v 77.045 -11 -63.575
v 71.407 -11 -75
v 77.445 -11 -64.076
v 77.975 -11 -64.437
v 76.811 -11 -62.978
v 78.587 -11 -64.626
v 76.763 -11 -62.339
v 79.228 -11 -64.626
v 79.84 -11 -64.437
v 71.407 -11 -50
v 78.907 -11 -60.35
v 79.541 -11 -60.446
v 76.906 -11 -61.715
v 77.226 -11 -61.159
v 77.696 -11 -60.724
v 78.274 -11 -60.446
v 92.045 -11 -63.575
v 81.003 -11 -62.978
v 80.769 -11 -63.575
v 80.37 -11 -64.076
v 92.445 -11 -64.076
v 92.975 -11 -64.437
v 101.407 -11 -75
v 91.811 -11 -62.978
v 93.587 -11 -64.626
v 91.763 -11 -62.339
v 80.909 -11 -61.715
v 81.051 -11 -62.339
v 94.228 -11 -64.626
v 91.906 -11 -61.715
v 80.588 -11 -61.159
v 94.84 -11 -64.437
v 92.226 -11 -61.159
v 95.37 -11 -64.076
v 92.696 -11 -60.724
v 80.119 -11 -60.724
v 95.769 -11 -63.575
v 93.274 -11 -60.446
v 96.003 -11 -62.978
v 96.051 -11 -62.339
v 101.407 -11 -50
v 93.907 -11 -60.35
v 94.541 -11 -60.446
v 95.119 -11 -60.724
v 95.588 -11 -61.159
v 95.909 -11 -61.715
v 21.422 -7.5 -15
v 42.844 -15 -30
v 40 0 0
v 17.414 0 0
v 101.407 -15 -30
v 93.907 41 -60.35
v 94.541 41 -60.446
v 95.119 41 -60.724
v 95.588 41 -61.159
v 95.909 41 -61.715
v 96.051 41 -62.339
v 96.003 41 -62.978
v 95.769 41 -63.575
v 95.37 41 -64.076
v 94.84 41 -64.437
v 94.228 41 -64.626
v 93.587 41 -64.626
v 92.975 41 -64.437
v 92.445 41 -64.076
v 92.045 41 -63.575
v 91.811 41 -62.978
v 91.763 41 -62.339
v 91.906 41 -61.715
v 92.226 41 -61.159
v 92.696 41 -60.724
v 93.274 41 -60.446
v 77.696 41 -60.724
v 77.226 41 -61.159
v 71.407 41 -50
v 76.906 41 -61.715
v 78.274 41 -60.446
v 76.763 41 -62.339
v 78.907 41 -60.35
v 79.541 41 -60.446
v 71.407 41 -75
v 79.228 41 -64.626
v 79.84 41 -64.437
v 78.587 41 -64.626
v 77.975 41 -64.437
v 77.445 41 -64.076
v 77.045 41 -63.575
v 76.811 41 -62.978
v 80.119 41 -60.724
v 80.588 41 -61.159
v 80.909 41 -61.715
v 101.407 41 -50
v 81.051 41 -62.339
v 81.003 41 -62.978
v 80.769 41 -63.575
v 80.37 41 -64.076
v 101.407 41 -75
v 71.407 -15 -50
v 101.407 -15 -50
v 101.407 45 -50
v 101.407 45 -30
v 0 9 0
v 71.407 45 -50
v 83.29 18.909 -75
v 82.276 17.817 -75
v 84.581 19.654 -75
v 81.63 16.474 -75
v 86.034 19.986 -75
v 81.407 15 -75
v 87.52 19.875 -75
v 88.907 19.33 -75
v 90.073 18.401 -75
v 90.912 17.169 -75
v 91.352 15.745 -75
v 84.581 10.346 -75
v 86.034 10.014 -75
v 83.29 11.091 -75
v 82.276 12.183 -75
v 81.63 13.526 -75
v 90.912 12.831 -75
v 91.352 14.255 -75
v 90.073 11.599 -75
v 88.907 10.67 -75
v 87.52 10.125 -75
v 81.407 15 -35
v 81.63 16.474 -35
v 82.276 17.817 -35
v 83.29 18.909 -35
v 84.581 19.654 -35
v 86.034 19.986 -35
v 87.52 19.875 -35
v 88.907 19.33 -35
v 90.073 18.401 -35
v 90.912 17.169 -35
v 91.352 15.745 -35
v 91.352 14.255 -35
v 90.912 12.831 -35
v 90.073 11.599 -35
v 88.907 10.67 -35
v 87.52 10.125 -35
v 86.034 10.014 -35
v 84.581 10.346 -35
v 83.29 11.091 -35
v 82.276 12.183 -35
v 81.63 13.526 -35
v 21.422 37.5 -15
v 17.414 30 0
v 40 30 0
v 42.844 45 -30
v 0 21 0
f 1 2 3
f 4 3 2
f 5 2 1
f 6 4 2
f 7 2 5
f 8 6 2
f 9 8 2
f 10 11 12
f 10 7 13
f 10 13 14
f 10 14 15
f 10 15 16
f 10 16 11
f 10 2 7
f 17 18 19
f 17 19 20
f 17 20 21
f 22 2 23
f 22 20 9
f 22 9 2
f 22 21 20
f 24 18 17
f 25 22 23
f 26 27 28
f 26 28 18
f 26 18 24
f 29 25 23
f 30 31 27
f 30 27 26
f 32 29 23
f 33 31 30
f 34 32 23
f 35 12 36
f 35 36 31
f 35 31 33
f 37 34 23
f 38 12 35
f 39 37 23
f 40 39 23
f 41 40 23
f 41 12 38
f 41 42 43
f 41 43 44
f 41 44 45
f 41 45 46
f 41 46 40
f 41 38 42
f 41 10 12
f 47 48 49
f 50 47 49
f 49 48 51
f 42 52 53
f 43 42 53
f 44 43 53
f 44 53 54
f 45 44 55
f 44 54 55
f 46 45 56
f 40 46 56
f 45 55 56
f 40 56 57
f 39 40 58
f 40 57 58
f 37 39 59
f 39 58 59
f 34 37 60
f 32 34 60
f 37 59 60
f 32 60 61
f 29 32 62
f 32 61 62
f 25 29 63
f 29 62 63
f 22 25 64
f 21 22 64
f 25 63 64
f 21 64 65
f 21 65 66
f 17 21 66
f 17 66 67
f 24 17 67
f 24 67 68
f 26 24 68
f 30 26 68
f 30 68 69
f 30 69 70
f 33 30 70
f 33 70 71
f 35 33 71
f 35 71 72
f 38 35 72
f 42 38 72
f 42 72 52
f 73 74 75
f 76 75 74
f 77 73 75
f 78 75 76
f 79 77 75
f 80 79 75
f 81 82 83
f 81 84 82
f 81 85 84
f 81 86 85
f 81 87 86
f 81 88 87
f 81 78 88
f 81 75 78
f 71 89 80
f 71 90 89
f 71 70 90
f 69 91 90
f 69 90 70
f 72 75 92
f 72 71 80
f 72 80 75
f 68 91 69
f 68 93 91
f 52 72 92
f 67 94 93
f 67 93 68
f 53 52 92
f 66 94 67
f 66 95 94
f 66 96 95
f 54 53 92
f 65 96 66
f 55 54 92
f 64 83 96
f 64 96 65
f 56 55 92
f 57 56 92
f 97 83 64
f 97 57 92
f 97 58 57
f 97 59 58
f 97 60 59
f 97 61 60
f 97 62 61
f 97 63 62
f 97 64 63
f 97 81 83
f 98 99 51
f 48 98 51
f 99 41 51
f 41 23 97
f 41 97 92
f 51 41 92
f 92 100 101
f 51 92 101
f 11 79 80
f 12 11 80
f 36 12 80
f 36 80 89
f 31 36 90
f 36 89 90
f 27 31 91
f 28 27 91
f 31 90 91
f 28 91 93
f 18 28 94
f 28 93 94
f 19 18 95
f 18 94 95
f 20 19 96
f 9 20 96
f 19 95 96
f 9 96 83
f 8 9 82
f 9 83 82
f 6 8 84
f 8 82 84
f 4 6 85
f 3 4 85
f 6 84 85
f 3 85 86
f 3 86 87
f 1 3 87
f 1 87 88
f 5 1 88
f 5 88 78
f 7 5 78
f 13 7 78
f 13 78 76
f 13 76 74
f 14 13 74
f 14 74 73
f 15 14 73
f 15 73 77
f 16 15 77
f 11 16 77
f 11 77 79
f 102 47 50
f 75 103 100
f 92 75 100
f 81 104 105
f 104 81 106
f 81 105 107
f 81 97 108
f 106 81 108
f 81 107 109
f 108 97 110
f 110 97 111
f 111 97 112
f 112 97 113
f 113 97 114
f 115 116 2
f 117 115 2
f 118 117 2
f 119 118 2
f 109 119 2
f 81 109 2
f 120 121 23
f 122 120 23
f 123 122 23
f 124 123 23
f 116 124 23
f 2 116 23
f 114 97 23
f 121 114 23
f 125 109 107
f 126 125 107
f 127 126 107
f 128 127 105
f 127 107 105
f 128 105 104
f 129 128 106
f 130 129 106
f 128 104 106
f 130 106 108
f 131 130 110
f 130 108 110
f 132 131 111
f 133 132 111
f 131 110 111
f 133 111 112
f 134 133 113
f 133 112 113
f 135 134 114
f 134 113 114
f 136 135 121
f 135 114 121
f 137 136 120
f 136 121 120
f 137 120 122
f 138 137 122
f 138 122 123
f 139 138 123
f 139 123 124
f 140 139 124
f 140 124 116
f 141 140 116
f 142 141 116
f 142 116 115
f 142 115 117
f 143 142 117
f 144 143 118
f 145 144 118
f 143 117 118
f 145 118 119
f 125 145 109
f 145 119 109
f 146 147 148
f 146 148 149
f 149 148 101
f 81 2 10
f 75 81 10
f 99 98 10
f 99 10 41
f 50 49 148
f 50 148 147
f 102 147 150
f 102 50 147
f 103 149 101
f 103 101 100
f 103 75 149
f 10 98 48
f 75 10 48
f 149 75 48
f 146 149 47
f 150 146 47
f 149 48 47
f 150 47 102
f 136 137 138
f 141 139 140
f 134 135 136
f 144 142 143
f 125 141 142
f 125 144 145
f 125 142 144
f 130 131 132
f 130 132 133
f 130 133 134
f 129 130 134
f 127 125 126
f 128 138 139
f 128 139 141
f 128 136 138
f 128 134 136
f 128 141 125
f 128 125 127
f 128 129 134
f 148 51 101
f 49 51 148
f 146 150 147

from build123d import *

# Parameters (mm, degrees)
EXTRUDE_1_DEPTH     = 30
EXTRUDE_2_DEPTH     = 101.4074
CUT_EXTRUDE_2_DEPTH = 140.67269183
CUT_EXTRUDE_3_DEPTH = 134.91587226
SKETCH_10_W         = 30
SKETCH_10_H         = 25
CUT_EXTRUDE_6_DEPTH = 4
SKETCH_11_W         = 30
SKETCH_11_H         = 25
CUT_EXTRUDE_7_DEPTH = 4
SKETCH_13_R         = 2.15
CUT_EXTRUDE_8_DEPTH = 139.001669711
SKETCH_14_R         = 5
CUT_EXTRUDE_9_DEPTH = 40


with BuildPart() as part:
    # 草图2 → 凸台-拉伸1 (new body)
    with BuildSketch(Plane(origin=(0, 0, 0), x_dir=(1, 0, 0), z_dir=(0, 1, 0))):
        Polygon((0, 0), (71.407400337, 50), (71.407400337, 75), (101.407400337, 75), (101.407400337, 30), (40, 0), align=None)
    extrude(amount=EXTRUDE_1_DEPTH)

    # 草图4 → 凸台-拉伸2 (add, through all)
    with BuildSketch(Plane(origin=(101.407400337, 0, 0), x_dir=(0, 0, -1), z_dir=(1, 0, 0))):
        Polygon((0, 30), (30, 45), (75, 45), (75, 30), align=None)
        Polygon((0, 0), (75, 0), (75, -15), (30, -15), align=None)
    extrude(amount=-EXTRUDE_2_DEPTH)

    # 草图5 → 切除-拉伸2 (cut, through all)
    with BuildSketch(Plane.XZ.offset(15)):
        Polygon((40, 0), (101.407400337, 0), (101.407400337, -30), align=None)
        Polygon((0, 0), (0, -75), (71.407400337, -75), (71.407400337, -50), align=None)
    extrude(amount=-CUT_EXTRUDE_2_DEPTH, mode=Mode.SUBTRACT)

    # 草图6 → 切除-拉伸3 (cut, through all)
    with BuildSketch(Plane(origin=(0, 0, 0), x_dir=(-0.8191520442889949, 0, 0.5735764363510418), z_dir=(-0.5735764363510418, 0, -0.8191520442889949))):
        Polygon((0, 21), (-26.151701934, 37.5), (0, 30), align=None)
        Polygon((0, 0), (-26.151701934, -7.5), (0, 9), align=None)
    extrude(amount=-CUT_EXTRUDE_3_DEPTH, mode=Mode.SUBTRACT)

    # 草图10 → 切除-拉伸6 (cut)
    with BuildSketch(Plane.XZ.offset(15)):
        with Locations((86.407400337, -62.5)):
            Rectangle(SKETCH_10_W, SKETCH_10_H)
    extrude(amount=-CUT_EXTRUDE_6_DEPTH, mode=Mode.SUBTRACT)

    # 草图11 → 切除-拉伸7 (cut)
    with BuildSketch(Plane(origin=(0, 45, 0), x_dir=(1, 0, 0), z_dir=(0, 1, 0))):
        with Locations((86.407400337, 62.5)):
            Rectangle(SKETCH_11_W, SKETCH_11_H)
    extrude(amount=-CUT_EXTRUDE_7_DEPTH, mode=Mode.SUBTRACT)

    # 草图13 → 切除-拉伸8 (cut, through all)
    with BuildSketch(Plane(origin=(0, 41, 0), x_dir=(1, 0, 0), z_dir=(0, 1, 0))):
        with Locations(Location((78.907400337, 62.5, 0), (0, 0, 270))):
            Circle(SKETCH_13_R)
        with Locations(Location((93.907400337, 62.5, 0), (0, 0, 270))):
            Circle(SKETCH_13_R)
    extrude(amount=-CUT_EXTRUDE_8_DEPTH, mode=Mode.SUBTRACT)

    # 草图14 → 切除-拉伸9 (cut)
    with BuildSketch(Plane(origin=(0, 0, -75), x_dir=(-1, 0, 0), z_dir=(0, 0, -1))):
        with Locations((-86.407400337, 15)):
            Circle(SKETCH_14_R)
    extrude(amount=-CUT_EXTRUDE_9_DEPTH, mode=Mode.SUBTRACT)


solid = part.part
